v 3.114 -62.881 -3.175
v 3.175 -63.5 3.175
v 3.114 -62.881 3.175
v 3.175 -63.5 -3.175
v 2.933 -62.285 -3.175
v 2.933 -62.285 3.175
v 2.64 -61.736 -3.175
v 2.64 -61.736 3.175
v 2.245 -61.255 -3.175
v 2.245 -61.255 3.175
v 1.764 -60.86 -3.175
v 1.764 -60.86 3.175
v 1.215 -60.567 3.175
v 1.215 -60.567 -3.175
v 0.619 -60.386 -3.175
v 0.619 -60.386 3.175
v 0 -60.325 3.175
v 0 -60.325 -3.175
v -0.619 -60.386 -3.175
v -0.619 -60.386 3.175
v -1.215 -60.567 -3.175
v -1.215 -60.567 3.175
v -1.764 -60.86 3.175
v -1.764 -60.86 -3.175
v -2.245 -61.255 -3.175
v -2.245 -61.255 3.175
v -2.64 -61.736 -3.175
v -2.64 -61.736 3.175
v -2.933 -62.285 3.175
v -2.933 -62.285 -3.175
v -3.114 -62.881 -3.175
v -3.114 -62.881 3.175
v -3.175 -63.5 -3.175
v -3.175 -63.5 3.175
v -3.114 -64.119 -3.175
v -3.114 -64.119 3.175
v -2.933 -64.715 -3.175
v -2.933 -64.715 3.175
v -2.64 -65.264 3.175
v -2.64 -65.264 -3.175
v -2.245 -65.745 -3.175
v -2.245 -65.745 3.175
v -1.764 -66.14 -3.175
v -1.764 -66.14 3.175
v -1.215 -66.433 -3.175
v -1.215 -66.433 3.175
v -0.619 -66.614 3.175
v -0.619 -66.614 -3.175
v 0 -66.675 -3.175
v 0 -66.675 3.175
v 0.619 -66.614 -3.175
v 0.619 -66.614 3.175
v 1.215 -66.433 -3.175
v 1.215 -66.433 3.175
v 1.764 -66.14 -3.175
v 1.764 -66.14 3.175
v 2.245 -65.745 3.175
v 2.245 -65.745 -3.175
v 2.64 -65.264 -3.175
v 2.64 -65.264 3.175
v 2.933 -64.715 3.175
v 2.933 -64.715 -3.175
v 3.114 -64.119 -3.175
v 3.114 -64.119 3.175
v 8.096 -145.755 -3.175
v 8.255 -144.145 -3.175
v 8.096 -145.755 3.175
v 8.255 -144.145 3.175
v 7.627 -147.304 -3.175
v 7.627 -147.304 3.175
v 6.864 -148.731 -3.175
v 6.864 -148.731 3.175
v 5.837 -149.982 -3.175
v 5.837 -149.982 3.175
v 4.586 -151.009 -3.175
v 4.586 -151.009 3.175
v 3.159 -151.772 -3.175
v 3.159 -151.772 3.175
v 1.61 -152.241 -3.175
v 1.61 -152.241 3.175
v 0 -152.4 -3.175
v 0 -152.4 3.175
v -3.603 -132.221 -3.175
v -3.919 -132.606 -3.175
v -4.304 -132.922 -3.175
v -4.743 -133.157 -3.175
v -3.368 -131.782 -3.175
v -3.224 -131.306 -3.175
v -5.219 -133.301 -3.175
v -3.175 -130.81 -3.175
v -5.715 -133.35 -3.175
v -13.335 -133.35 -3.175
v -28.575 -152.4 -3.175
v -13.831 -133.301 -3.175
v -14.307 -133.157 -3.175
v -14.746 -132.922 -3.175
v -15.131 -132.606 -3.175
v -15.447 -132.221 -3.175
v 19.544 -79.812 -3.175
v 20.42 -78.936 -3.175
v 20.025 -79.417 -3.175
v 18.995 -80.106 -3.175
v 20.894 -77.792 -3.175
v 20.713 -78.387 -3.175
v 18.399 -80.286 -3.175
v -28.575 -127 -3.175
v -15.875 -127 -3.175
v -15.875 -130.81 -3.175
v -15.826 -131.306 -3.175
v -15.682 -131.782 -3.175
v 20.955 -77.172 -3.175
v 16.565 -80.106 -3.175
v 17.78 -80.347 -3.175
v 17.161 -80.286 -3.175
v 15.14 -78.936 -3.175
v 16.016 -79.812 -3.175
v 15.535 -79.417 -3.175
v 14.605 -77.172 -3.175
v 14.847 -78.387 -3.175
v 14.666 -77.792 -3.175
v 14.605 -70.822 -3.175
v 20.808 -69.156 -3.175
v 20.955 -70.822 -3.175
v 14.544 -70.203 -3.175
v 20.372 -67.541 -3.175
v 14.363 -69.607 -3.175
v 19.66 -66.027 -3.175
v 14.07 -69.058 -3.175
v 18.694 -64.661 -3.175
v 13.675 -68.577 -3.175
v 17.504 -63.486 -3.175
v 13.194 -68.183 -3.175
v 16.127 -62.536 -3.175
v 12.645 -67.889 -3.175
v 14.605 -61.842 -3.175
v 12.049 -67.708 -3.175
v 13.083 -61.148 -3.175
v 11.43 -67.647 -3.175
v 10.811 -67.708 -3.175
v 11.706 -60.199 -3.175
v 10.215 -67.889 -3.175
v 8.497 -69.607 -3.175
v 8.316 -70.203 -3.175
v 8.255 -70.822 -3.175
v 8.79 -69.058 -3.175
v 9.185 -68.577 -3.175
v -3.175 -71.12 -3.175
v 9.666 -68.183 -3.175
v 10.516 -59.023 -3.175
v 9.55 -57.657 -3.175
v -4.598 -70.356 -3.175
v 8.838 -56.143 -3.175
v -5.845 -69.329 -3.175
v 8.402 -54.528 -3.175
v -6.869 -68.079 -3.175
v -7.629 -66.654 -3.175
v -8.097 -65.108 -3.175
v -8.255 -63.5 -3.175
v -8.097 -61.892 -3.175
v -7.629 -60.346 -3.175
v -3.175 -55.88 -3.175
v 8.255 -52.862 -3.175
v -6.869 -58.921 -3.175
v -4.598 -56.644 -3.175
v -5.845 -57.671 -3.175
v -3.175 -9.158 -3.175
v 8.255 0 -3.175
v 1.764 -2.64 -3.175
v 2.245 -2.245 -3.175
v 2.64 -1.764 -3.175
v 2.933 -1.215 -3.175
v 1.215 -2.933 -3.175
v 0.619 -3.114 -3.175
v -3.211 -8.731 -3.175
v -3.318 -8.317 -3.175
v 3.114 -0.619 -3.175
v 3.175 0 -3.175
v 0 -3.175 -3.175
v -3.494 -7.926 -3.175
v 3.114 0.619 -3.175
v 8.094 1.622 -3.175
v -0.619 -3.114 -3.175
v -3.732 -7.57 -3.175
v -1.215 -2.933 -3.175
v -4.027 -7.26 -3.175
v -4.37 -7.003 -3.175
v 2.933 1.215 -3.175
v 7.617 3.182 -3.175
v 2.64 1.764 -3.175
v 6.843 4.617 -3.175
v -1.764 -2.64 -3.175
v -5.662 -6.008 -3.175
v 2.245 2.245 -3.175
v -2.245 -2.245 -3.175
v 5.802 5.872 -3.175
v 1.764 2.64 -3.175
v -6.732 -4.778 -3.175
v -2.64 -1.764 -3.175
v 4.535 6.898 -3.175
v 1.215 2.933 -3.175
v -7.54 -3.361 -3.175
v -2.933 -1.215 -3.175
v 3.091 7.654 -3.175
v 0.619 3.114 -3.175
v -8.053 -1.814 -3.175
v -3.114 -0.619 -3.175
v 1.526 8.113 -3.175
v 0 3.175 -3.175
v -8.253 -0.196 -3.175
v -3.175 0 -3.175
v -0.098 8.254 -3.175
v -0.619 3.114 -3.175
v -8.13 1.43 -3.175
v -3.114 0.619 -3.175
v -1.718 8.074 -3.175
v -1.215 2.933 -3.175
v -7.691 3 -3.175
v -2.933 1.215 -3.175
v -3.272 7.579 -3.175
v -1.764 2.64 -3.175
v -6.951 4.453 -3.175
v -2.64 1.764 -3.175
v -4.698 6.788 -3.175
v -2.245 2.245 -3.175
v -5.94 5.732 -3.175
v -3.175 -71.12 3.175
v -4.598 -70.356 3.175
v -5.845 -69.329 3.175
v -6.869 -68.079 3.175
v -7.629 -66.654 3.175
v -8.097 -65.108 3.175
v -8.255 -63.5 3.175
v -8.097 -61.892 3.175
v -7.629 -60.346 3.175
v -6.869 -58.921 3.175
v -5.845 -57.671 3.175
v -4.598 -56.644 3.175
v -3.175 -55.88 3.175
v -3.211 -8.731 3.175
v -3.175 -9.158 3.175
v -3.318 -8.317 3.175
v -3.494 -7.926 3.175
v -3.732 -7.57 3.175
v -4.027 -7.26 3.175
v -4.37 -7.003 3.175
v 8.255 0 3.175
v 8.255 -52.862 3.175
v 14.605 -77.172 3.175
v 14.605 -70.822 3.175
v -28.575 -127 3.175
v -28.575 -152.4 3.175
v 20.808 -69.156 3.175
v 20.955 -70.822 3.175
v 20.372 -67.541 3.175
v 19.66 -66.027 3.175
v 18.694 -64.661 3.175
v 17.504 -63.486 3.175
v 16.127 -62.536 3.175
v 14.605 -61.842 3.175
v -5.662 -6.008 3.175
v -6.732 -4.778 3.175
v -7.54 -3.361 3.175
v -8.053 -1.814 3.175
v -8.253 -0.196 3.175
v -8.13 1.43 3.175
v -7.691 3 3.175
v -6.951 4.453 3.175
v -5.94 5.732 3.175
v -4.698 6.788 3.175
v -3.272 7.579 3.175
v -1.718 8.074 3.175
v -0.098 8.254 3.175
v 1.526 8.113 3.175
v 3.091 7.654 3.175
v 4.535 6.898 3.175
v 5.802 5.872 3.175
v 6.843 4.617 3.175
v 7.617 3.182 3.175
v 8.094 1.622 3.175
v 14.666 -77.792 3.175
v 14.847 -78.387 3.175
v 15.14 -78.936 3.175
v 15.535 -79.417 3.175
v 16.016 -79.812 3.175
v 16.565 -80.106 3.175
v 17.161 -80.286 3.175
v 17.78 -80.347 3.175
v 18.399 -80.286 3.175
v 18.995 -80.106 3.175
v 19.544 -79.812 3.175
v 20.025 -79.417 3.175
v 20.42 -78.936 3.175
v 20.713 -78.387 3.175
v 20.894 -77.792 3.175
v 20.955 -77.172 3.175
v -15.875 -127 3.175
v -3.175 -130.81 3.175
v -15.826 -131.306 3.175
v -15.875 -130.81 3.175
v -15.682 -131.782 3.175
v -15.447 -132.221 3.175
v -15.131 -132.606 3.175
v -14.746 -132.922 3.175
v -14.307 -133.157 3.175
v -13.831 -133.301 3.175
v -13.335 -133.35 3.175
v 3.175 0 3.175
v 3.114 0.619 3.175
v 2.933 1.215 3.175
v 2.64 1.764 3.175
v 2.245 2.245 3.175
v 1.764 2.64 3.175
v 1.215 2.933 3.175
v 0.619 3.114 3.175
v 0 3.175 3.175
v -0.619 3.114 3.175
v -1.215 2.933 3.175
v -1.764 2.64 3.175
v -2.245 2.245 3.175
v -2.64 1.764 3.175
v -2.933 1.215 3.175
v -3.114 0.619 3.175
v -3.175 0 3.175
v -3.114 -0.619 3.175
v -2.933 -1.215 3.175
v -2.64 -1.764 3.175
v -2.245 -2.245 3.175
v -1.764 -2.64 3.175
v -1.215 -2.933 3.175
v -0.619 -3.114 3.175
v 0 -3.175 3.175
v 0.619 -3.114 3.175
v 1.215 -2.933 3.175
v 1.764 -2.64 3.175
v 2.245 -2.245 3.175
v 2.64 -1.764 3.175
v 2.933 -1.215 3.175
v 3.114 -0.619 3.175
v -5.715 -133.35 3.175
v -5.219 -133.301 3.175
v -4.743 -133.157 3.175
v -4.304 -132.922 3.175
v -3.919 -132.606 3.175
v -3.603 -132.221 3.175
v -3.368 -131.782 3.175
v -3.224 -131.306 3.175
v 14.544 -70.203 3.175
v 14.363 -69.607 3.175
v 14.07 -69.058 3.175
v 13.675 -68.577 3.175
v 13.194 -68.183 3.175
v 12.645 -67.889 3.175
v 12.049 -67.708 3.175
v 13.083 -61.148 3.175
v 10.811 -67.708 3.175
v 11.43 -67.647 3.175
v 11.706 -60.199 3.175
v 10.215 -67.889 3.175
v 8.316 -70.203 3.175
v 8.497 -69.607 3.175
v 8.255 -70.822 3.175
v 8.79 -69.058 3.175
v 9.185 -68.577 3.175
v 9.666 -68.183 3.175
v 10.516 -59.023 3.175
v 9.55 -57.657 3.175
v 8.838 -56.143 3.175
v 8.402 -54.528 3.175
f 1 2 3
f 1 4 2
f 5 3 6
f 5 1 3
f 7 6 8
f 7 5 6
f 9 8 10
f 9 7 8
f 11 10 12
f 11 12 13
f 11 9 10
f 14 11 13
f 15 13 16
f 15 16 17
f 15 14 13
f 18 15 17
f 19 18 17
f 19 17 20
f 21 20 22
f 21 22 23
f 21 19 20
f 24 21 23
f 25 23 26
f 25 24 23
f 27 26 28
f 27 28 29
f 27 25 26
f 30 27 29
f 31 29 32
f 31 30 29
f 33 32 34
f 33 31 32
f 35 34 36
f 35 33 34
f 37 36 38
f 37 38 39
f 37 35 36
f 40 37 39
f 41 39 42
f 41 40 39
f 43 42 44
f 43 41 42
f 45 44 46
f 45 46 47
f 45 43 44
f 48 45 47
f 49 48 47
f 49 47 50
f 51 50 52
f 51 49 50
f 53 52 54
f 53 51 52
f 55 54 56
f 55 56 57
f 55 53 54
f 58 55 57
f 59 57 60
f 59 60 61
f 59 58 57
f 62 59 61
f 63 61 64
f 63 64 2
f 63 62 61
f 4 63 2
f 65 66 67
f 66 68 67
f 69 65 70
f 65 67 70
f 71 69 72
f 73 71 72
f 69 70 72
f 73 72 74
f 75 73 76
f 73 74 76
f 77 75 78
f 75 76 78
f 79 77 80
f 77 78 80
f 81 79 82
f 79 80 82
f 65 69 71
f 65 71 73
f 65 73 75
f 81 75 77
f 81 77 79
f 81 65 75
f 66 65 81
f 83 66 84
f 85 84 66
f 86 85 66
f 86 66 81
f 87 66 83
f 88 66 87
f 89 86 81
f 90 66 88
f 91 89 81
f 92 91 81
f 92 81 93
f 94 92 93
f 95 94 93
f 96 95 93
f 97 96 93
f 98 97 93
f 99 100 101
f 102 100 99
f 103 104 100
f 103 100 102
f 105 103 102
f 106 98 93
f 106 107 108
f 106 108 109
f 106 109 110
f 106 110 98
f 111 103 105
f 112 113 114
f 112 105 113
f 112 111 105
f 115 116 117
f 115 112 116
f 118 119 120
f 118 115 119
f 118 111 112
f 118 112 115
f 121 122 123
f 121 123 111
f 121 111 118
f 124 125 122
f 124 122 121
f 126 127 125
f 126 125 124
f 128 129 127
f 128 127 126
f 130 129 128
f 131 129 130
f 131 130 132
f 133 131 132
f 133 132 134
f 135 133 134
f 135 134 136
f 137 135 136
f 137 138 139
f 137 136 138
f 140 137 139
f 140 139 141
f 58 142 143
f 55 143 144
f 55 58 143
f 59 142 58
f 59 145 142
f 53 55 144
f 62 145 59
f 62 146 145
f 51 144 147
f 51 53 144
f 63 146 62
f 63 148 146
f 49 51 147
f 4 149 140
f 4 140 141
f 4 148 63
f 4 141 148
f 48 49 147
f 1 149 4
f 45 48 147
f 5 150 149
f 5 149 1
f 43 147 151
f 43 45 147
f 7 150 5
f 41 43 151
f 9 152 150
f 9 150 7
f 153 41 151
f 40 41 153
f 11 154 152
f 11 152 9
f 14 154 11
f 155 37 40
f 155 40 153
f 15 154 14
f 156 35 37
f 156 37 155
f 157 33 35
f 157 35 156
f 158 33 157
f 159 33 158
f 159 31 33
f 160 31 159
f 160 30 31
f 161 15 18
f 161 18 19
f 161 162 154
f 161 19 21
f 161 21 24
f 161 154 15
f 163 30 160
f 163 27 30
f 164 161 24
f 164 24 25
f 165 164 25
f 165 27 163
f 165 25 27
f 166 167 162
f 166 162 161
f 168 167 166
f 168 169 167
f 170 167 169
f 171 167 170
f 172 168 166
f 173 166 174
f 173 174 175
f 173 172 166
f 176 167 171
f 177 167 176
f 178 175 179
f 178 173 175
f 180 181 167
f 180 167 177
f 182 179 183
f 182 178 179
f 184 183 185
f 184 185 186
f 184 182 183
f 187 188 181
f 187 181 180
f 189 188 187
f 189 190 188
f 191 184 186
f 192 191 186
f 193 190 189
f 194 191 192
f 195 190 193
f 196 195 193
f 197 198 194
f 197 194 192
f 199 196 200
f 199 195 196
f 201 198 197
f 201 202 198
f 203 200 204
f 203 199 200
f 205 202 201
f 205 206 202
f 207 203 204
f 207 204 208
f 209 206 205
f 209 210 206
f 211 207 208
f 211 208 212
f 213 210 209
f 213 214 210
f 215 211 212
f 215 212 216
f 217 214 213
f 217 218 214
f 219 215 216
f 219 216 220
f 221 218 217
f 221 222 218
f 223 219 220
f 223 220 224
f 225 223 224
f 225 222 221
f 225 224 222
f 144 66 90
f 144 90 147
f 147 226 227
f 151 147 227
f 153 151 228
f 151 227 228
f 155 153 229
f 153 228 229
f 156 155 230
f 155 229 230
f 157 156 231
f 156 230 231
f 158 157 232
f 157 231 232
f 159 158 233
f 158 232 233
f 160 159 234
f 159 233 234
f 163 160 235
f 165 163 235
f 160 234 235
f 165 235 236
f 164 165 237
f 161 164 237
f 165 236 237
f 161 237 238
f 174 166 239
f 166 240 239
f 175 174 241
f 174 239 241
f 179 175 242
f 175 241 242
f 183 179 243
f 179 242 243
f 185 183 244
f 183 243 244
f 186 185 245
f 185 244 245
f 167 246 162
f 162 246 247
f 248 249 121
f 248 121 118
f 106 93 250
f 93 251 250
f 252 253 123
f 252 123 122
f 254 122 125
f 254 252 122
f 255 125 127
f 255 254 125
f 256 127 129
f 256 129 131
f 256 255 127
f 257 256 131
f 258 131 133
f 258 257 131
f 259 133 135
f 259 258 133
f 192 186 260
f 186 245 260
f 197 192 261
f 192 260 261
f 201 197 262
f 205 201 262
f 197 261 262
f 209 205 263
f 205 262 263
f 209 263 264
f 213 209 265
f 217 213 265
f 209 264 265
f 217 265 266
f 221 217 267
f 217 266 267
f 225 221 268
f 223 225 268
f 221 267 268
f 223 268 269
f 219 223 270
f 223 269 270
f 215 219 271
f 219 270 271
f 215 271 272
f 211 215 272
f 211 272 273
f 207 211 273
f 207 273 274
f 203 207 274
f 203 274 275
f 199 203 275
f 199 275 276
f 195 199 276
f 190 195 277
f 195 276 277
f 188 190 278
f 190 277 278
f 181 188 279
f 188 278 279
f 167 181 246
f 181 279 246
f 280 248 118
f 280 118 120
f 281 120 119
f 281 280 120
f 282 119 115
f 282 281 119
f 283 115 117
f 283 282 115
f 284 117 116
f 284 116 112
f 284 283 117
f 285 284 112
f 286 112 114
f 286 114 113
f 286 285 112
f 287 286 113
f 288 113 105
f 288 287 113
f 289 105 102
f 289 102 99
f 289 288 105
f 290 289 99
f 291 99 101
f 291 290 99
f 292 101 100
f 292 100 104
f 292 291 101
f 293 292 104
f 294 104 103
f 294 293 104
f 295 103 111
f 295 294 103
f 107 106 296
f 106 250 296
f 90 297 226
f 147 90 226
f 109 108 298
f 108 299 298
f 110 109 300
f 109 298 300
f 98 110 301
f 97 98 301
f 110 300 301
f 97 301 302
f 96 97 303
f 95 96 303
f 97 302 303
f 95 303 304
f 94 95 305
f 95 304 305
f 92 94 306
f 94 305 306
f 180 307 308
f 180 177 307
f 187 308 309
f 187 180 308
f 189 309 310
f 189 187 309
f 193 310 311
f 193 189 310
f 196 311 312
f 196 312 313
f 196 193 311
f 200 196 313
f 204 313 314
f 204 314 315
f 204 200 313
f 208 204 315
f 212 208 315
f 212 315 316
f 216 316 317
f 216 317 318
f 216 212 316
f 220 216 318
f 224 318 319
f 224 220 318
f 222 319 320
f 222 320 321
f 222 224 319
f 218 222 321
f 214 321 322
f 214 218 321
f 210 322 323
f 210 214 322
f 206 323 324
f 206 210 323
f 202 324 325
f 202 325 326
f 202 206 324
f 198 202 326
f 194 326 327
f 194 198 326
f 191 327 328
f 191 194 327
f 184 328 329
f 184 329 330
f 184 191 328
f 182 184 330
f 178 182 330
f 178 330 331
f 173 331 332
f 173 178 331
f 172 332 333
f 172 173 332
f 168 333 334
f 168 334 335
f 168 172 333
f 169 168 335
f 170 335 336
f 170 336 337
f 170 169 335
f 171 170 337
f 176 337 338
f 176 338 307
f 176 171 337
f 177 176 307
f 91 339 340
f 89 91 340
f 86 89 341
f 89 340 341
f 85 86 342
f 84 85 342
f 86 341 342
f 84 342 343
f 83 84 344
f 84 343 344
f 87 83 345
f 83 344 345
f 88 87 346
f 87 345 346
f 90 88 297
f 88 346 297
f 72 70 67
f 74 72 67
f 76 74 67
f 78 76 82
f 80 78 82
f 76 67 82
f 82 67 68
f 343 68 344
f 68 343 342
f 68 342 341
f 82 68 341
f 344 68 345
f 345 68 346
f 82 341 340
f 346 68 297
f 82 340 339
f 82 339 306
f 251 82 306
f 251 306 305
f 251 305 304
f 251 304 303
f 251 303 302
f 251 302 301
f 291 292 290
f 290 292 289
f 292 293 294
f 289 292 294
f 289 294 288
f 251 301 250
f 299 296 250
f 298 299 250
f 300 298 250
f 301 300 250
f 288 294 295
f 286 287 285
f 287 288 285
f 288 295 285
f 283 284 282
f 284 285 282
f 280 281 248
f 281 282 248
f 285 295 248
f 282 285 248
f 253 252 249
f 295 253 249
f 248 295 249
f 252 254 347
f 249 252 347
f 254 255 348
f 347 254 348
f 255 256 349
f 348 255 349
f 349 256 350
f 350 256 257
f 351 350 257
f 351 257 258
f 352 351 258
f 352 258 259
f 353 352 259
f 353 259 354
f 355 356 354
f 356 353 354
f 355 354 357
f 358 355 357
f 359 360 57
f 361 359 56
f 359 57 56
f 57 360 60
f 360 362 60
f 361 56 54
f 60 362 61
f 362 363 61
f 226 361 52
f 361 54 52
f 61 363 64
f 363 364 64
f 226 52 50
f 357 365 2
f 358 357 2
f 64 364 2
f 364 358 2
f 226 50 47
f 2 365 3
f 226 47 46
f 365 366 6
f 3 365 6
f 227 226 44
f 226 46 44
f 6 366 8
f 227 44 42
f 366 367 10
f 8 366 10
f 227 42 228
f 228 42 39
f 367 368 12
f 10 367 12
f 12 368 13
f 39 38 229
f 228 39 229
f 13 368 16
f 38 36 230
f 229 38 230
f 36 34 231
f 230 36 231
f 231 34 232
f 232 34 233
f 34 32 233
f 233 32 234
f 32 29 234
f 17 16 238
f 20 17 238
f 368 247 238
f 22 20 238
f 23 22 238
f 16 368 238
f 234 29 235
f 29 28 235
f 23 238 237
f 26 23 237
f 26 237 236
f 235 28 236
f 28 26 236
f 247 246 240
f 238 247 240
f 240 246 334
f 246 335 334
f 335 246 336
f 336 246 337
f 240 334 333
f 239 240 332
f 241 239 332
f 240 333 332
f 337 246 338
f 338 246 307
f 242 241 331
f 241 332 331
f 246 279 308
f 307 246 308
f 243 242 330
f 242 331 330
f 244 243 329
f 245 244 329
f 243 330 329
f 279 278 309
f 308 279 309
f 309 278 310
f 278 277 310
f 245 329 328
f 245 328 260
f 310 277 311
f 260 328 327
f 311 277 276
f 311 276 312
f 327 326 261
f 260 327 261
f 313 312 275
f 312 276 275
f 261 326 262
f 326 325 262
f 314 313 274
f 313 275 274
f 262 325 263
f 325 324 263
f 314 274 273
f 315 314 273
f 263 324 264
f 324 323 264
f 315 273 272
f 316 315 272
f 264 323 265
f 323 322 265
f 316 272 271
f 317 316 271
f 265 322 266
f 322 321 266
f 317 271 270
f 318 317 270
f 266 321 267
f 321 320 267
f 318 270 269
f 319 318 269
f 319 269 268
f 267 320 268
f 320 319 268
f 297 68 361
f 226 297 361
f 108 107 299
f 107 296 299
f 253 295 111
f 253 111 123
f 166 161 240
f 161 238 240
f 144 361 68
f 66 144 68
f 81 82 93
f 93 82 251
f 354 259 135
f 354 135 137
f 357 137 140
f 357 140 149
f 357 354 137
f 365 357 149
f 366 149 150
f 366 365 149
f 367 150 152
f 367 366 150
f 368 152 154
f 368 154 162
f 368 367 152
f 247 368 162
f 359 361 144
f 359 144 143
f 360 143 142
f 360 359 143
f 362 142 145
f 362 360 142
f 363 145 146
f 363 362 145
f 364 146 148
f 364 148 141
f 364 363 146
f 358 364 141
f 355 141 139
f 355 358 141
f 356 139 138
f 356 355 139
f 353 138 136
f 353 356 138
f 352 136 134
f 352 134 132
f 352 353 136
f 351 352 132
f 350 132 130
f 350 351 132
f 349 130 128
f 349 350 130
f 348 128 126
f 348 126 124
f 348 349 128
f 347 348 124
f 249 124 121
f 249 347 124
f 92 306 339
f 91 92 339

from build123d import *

# Parameters (mm, degrees)
SKETCH1_R           = 3.175
BOSS_EXTRUDE1_DEPTH = 3.175
FILLET1_R           = 2.54
BOSS_EXTRUDE2_DEPTH = 6.35


with BuildPart() as part:
    # Sketch1 → Boss-Extrude1 (new, symmetric)
    with BuildSketch(Plane.XY):
        with BuildLine():
            Line((8.255, 0), (8.255, -144.145))
            ThreePointArc((8.255, -144.145), (5.837166479, -149.982166479), (0, -152.4))
            Line((0, -152.4), (-28.575, -152.4))
            Line((-28.575, -152.4), (-28.575, -127))
            Line((-28.575, -127), (-15.875, -127))
            Line((-15.875, -127), (-15.875, -130.81))
            ThreePointArc((-15.875, -130.81), (-15.131051224, -132.606051224), (-13.335, -133.35))
            Line((-13.335, -133.35), (-5.715, -133.35))
            ThreePointArc((-5.715, -133.35), (-3.918948776, -132.606051224), (-3.175, -130.81))
            Line((-3.175, -130.81), (-3.175, -71.12))
            ThreePointArc((-3.175, -71.12), (-8.255, -63.5), (-3.175, -55.88))
            Line((-3.175, -55.88), (-3.175, -7.62))
            ThreePointArc((-3.175, -7.62), (-4.57905012, 6.86857518), (8.255, 0))
        make_face()
        Circle(SKETCH1_R, mode=Mode.SUBTRACT)
        with Locations((0, -63.5)):
            Circle(SKETCH1_R, mode=Mode.SUBTRACT)
    extrude(amount=BOSS_EXTRUDE1_DEPTH, both=True)

    # Fillet1
    fillet1_edges = [part.edges().sort_by_distance(p)[0] for p in [
        (-3.175, -7.62, 0),
    ]]
    fillet(fillet1_edges, radius=FILLET1_R)

    # Sketch2 → Boss-Extrude2 (add)
    with BuildSketch(Plane.XY.offset(3.175)):
        with BuildLine():
            Line((14.605, -70.822423777), (14.605, -77.172423777))
            ThreePointArc((14.605, -77.172423777), (17.78, -80.347423777), (20.955, -77.172423777))
            Line((20.955, -77.172423777), (20.955, -70.822423777))
            ThreePointArc((20.955, -70.822423777), (19.207129933, -65.323162463), (14.605, -61.842167656))
            ThreePointArc((14.605, -61.842167656), (10.002870067, -58.361172848), (8.255, -52.861911534))
            Line((8.255, -52.861911534), (8.255, -70.822423777))
            ThreePointArc((8.255, -70.822423777), (11.43, -67.647423777), (14.605, -70.822423777))
        make_face()
    extrude(amount=-BOSS_EXTRUDE2_DEPTH)


solid = part.part
